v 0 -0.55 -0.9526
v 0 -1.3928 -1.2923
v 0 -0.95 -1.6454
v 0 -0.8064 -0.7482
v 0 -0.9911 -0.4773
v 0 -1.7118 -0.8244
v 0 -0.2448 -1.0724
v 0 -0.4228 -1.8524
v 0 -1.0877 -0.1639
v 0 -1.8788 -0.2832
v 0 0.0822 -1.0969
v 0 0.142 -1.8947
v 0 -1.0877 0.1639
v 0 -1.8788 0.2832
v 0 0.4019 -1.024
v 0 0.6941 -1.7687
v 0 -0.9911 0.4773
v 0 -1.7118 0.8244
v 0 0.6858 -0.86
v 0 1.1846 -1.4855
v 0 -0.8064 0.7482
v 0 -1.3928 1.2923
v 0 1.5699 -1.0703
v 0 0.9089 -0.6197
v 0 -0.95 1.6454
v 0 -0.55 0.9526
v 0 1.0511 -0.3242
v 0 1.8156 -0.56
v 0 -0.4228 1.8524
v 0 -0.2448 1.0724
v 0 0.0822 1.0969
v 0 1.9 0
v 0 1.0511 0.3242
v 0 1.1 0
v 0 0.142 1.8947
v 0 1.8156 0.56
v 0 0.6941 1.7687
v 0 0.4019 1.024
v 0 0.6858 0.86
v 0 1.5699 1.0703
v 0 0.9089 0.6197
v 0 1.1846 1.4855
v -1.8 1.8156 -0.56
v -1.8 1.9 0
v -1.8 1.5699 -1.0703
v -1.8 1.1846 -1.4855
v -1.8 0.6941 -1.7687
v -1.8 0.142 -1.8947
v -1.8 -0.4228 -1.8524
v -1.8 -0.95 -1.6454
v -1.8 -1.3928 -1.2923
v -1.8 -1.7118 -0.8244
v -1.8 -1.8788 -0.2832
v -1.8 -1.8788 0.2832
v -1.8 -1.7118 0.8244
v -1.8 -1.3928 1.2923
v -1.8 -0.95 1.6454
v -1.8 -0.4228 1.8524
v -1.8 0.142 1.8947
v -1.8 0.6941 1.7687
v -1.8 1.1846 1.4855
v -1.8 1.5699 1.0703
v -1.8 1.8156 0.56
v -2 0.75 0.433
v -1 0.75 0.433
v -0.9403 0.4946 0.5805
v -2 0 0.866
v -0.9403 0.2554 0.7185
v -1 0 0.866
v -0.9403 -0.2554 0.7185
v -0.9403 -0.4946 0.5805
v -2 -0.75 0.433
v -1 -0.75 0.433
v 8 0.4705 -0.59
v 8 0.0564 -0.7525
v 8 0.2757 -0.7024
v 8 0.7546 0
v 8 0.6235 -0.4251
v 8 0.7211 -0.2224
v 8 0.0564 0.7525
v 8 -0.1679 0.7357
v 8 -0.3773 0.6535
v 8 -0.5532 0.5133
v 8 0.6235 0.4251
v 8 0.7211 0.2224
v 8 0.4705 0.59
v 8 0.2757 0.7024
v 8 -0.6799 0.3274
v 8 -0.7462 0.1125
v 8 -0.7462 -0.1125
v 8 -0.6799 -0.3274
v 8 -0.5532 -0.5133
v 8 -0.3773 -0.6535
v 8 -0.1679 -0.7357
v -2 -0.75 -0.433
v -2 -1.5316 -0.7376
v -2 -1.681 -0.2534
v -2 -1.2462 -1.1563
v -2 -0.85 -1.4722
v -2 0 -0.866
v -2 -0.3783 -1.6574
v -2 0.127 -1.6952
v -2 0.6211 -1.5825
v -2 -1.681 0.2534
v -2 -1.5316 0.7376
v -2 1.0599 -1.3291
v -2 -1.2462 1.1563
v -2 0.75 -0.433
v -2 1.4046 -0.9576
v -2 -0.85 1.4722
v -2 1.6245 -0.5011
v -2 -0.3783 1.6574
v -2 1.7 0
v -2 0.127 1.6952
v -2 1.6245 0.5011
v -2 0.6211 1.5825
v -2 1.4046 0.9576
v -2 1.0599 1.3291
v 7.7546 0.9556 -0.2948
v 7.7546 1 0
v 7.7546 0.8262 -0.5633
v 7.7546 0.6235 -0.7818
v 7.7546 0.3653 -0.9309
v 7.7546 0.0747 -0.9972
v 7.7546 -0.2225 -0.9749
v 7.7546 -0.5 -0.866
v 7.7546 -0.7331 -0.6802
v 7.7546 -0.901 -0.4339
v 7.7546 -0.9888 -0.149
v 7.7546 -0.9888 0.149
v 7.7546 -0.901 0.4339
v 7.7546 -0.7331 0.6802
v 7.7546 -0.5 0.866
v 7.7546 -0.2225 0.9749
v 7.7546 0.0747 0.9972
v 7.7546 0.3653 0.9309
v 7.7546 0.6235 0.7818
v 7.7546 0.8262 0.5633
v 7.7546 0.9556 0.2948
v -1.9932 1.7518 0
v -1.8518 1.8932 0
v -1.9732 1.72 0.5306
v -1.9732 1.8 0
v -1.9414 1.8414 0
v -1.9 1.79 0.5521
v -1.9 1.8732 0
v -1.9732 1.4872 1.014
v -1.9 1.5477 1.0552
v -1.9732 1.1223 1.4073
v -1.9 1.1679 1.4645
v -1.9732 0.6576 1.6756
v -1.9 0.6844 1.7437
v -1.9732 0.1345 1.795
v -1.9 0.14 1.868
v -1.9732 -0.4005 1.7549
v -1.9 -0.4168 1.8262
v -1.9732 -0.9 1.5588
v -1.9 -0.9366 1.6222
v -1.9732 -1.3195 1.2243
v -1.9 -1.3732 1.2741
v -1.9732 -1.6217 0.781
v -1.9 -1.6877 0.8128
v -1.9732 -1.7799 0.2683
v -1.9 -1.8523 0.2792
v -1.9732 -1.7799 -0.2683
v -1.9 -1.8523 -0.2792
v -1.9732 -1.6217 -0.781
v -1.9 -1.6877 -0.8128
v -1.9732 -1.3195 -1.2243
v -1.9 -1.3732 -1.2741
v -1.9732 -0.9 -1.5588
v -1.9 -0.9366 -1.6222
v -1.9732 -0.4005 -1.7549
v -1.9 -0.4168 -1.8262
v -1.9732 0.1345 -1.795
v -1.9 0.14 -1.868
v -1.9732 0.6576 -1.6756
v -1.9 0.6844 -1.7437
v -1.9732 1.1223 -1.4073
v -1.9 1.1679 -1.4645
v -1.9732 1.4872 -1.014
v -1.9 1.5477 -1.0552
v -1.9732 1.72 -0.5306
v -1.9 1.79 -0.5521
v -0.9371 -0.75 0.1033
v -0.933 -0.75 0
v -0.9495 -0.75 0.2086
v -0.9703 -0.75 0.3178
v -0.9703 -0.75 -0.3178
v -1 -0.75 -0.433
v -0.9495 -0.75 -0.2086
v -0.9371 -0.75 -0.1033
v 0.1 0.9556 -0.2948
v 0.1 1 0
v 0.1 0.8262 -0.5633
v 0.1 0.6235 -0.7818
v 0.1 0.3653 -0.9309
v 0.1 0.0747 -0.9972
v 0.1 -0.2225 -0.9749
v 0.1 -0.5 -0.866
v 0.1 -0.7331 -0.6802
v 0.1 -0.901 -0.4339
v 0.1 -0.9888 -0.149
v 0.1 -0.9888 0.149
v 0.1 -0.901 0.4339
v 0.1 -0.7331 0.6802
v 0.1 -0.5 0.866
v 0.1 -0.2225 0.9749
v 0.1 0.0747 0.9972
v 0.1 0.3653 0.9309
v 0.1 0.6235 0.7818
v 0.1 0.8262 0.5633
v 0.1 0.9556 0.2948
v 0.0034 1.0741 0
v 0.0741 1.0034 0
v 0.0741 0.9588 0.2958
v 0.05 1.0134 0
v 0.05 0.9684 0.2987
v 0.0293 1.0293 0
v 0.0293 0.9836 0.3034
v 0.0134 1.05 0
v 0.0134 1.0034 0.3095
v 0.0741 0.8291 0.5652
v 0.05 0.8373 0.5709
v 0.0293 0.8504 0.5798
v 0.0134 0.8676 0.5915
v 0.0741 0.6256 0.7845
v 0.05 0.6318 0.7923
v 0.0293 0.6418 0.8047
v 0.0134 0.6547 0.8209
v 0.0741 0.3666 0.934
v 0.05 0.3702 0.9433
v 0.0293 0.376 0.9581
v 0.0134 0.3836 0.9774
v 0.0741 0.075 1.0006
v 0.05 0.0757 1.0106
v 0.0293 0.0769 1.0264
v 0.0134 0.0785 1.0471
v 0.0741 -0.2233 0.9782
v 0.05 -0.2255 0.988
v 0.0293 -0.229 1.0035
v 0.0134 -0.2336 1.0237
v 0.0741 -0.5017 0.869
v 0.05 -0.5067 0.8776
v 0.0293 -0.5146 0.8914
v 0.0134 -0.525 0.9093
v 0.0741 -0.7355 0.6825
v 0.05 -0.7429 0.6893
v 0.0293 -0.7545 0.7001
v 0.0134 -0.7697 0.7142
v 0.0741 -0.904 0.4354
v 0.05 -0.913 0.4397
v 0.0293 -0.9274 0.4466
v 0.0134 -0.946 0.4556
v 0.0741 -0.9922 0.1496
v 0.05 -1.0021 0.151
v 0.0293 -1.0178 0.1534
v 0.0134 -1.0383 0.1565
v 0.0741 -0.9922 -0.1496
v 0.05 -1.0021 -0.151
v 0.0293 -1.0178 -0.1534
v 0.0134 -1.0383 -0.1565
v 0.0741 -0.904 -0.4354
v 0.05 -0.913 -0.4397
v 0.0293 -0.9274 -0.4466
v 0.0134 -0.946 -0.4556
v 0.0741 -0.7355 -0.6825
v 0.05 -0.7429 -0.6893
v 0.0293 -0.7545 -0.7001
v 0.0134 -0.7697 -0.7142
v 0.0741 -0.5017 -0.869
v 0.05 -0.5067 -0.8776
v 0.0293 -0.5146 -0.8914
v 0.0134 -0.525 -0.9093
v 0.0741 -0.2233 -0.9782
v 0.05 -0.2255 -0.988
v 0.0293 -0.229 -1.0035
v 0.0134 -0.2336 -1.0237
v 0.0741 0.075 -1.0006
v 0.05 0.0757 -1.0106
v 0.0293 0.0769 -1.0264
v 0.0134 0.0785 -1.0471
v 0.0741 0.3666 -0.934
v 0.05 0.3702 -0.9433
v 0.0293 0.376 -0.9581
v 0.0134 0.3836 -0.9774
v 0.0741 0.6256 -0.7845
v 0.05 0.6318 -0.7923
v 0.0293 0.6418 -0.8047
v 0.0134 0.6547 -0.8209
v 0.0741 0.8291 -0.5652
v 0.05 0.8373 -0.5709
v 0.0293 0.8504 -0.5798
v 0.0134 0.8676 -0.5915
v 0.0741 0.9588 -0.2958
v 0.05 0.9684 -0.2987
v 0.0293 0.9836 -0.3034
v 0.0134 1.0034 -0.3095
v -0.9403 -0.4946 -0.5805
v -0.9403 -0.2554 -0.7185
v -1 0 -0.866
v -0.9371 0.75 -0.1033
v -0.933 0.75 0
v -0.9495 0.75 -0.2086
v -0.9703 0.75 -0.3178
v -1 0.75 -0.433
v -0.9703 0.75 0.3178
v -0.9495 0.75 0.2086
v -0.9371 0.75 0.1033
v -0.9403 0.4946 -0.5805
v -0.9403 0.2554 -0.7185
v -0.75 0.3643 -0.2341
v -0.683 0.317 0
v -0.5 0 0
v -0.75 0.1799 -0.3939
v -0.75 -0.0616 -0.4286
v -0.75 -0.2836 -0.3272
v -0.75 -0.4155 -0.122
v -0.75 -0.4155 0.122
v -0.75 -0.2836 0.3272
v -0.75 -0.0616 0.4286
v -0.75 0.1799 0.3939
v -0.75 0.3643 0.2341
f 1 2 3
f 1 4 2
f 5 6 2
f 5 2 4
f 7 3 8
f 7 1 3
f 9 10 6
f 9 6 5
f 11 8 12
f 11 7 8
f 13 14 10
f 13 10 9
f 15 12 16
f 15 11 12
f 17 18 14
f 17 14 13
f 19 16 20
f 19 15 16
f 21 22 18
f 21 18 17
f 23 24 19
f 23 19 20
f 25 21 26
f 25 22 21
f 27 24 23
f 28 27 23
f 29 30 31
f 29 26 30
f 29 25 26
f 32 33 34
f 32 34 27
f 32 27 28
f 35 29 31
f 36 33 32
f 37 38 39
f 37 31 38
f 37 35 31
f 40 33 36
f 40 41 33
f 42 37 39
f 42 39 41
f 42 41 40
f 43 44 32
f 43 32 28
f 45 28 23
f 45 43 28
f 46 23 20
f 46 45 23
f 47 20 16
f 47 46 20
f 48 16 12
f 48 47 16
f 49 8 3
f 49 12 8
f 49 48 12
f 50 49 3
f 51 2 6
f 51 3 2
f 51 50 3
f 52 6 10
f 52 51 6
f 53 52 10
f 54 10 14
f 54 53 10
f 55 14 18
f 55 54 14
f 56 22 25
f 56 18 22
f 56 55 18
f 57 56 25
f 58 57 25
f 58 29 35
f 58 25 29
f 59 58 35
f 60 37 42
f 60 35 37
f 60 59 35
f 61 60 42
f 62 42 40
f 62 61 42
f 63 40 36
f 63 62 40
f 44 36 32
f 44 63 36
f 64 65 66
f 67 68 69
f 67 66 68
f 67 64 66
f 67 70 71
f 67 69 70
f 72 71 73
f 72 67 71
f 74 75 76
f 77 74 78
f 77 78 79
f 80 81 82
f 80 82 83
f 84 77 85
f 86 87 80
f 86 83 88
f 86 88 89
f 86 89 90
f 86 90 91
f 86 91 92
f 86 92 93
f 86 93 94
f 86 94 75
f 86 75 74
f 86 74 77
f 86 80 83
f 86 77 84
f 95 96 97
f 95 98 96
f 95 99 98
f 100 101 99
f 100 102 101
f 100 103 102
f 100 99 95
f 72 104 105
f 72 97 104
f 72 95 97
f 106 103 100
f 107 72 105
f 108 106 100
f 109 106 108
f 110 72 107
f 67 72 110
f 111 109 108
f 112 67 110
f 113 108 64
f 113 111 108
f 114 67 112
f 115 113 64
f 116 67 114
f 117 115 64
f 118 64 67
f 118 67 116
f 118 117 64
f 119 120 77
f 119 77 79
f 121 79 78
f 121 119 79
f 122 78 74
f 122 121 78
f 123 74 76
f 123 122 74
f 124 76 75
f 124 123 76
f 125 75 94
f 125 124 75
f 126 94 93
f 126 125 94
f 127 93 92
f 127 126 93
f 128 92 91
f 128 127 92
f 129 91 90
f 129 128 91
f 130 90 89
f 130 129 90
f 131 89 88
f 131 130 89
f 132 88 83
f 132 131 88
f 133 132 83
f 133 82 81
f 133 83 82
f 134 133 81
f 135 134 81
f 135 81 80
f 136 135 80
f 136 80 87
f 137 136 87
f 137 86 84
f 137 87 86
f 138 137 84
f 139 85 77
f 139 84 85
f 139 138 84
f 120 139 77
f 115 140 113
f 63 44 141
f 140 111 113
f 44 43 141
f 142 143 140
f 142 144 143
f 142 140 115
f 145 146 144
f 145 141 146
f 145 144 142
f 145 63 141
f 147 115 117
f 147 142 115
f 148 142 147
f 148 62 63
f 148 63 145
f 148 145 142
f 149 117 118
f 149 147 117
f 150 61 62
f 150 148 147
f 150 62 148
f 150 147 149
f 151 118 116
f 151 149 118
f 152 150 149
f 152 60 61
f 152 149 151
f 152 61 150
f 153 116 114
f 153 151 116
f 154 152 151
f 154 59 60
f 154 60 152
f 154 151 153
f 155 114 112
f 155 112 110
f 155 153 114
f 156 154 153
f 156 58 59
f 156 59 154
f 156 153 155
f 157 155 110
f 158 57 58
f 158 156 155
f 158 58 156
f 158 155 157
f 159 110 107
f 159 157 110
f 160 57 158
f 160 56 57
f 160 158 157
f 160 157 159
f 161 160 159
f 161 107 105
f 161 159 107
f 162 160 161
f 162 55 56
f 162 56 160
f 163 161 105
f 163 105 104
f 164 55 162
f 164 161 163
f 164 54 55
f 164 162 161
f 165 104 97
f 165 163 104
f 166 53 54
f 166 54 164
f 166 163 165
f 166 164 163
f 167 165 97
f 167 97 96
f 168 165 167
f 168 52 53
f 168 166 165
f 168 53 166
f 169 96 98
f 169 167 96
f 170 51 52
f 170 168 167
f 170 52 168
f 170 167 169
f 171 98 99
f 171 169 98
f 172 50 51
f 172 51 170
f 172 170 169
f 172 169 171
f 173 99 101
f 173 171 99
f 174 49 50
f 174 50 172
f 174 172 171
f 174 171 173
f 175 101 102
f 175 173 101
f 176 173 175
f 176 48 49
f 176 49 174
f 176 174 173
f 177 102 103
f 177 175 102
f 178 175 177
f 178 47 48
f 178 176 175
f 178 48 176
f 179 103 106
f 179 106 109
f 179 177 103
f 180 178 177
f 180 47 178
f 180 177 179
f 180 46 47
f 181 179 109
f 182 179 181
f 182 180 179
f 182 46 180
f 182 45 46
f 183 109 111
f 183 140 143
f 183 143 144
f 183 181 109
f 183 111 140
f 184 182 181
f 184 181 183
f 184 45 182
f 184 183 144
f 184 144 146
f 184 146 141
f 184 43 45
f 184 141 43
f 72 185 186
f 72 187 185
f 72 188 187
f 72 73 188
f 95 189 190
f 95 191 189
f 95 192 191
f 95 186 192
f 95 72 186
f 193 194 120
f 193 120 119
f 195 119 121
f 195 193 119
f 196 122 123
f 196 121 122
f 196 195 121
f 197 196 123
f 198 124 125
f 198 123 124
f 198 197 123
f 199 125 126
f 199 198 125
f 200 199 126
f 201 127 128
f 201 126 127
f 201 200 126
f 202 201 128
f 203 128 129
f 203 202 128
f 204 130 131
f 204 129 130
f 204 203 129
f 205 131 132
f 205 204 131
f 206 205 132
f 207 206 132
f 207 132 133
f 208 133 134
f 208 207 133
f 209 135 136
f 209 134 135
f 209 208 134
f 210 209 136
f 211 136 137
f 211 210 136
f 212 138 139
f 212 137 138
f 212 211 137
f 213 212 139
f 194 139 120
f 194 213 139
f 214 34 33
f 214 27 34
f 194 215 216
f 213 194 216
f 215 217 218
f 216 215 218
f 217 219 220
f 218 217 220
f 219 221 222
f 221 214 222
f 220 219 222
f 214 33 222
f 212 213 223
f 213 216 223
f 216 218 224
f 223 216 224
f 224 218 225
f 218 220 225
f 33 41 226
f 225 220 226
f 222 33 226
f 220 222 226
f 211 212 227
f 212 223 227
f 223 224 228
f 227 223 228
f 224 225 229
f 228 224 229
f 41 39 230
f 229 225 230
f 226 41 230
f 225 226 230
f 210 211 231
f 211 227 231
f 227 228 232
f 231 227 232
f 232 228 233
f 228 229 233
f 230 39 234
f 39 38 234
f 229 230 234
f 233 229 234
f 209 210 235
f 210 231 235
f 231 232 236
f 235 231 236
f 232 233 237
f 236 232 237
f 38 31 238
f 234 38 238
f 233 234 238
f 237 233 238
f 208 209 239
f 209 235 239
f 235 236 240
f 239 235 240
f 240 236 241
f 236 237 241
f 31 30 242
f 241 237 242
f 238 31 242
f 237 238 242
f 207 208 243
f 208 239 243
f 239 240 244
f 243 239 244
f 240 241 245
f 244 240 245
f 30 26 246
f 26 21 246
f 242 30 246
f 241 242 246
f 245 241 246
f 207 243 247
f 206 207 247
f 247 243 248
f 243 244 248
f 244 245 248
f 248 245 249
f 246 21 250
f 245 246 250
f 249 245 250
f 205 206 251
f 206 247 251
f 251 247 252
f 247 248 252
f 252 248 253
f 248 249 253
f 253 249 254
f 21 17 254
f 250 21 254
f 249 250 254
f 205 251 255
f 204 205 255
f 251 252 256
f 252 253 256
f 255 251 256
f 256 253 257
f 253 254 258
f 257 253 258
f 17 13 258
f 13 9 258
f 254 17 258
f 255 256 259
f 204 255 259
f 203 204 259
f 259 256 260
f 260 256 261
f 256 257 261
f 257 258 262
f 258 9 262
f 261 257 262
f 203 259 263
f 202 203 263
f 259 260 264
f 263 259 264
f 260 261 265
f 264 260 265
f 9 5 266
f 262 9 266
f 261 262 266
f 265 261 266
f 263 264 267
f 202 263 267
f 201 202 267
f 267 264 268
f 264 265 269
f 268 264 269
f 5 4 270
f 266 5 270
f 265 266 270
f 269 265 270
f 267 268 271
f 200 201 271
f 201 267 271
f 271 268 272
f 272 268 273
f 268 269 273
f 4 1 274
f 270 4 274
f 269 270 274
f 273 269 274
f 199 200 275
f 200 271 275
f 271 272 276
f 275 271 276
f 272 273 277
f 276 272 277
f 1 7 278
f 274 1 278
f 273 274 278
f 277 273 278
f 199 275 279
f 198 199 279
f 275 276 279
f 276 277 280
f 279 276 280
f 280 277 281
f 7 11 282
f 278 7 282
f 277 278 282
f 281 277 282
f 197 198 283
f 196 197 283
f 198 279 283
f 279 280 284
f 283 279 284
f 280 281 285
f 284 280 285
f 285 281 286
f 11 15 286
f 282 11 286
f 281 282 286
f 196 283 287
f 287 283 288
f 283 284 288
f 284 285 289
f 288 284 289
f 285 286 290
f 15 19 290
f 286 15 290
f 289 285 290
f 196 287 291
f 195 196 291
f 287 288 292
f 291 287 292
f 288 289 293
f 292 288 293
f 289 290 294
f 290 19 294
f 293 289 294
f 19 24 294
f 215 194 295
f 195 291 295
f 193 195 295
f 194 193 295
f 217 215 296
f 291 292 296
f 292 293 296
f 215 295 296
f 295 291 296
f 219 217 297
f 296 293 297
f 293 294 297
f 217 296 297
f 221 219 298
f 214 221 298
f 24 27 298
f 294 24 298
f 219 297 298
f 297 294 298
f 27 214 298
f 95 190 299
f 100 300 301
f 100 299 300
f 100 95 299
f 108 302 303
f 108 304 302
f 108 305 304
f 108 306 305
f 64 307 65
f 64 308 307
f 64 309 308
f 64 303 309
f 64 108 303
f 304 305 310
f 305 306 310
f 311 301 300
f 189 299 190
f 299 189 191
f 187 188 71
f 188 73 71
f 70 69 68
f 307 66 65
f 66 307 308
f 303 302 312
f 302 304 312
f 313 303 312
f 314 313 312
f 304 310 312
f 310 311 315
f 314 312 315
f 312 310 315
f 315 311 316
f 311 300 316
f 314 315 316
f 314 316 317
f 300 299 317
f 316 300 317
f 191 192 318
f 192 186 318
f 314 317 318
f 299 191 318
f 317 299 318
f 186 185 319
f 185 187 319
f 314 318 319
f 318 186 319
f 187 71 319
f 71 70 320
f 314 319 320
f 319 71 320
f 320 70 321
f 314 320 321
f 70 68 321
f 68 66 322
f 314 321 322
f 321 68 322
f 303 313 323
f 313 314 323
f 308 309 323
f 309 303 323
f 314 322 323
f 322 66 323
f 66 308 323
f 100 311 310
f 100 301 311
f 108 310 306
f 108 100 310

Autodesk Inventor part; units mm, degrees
ref_plane "YZ Plane" through (0, 0, 0) normal (1, 0, 0) x (0, 1, 0)
ref_plane "XZ Plane" through (0, 0, 0) normal (0, 1, 0) x (-1, 0, 0)
sketch "Skizze1" plane through (0, 0, 0) normal (0, 0, 1) x (1, 0, 0)
  line L0 (-0.5, 0) -> (8, 0)
  line L1 (8, 0) -> (8, 1)
  line L2 (8, 1) -> (1.2, 1)
  line L3 (1.2, 1) -> (0.9545, 1)
  line L4 (0.9545, 1) -> (0, 1)
  line L5 (0, 1) -> (0, 1.9)
  line L6 (0, 1.9) -> (-2, 1.9)
  line L7 (-2, 1.9) -> (-2, 0.866)
  line L8 (-2, 0.866) -> (-1, 0.866)
  line L9 (-1, 0.866) -> (-0.5, 0)
  line L10 (-4, 0) -> (10, 0) projected
  line L11 (0, -0.38) -> (0, 2.28) projected
  line L12 (1.2, 1) -> (0, 1) construction
  dimension "d1" = 6.8
  dimension "d2" = 0.2455
  dimension "d3" = 2
  dimension "d4" = 1
  dimension "d5" = 60
  dimension "d6" = 2
  dimension "d7" = 2
  dimension "d8" = 1.7321
  dimension "d9" = 3.8
  dimension "d26" = 8
revolve "Körper" add sketch "Skizze1" angle 360 about axis through (-0.5, 0, 0) along (1, 0, 0)
sketch "Skizze2" plane through (-2, 0, 0) normal (-1, 0, 0) x (0, 0, 1)
  circle A0 centre (0, 0) radius 0.866 projected
  line L0 (0, -2.66) -> (0, 2.66) projected
  line L1 (-2.66, 0) -> (2.66, 0) projected
  line L2 (0.866, 0) -> (0.433, -0.75)
  line L3 (0.433, -0.75) -> (-0.433, -0.75)
  line L4 (-0.433, -0.75) -> (-0.866, 0)
  line L5 (-0.866, 0) -> (-0.433, 0.75)
  line L6 (-0.433, 0.75) -> (0.433, 0.75)
  line L7 (0.433, 0.75) -> (0.866, 0)
  point P0 (0, 0)
extrude "Loch" add sketch "Skizze2" against normal up to next contours L7 A0 | A0 L2 | L6 L0 A0 | A0 L0 L3 | L0 L6 A0 | A0 L3 L0 | L4 A0 | A0 L5
fillet "Rundung1" radius 0.2 1 edges at (-2, -1.9, 0)
thread "Gewinde" size "M2x0.4" class "6g" standard "ISO Metric profile" length 6.8
chamfer "Fase1" distance 0.2454 distance2 0.2454 1 edges at (8, -1, 0) measured on face at (8, 0.1182, 0.3117)
ref_plane "Work Plane1" through (29, 0, 0) normal (0, -1, 0) x (1, 0, 0)
fillet "Fillet2" radius 0.1 1 edges at (0, -1, 0)
equation "\"d1\" = GEL"
equation "\"d3\" = KOH"
equation "\"d4\" = INTI"
equation "\"d6\" = GD"
equation "\"d7\" = BDM"
equation "\"d8\" = 1.1547 * SW"
equation "\"d9\" = KOD"
equation "\"d26\" = NLG"
equation "\"d30\" = R"
equation "\"d17\" = RR"
equation "\"d13\" = GEL"
equation "\"d15\" = -0.5 * SPD + 0.5 * GD"
equation "\"d16\" = GUL"
equation "\"GD\" = 2"
equation "\"NLG\" = 8"
equation "\"GEL\" = 6.8"
equation "\"KOD\" = 3.8"
equation "\"KOH\" = 2"
equation "\"INTI\" = 1"
equation "\"GAL\" = 0.61345 * PTC"
equation "\"GUL\" = 0.61345 * PTC"
equation "\"BDM\" = NND"
equation "\"SW\" = 1.5"
equation "\"RR\" = 0.2"
equation "\"SPD\" = NND - 1.2269 * PTC"
equation "\"R\" = 0.1"
equation "\"TOA\" = 30deg"
equation "\"GD1\" = THREADDIA - 1.2269 * PTC"
equation "\"THREADDIA\" = 2"
equation "\"FAWI\" = 45deg"
equation "\"PTC\" = 0.4"
equation "\"NND\" = 2"
equation "\"E0\" = 1.155 * SW"
properties part number "ISO 4762  - M2 x 8" material "Edelstahl, 440C"
